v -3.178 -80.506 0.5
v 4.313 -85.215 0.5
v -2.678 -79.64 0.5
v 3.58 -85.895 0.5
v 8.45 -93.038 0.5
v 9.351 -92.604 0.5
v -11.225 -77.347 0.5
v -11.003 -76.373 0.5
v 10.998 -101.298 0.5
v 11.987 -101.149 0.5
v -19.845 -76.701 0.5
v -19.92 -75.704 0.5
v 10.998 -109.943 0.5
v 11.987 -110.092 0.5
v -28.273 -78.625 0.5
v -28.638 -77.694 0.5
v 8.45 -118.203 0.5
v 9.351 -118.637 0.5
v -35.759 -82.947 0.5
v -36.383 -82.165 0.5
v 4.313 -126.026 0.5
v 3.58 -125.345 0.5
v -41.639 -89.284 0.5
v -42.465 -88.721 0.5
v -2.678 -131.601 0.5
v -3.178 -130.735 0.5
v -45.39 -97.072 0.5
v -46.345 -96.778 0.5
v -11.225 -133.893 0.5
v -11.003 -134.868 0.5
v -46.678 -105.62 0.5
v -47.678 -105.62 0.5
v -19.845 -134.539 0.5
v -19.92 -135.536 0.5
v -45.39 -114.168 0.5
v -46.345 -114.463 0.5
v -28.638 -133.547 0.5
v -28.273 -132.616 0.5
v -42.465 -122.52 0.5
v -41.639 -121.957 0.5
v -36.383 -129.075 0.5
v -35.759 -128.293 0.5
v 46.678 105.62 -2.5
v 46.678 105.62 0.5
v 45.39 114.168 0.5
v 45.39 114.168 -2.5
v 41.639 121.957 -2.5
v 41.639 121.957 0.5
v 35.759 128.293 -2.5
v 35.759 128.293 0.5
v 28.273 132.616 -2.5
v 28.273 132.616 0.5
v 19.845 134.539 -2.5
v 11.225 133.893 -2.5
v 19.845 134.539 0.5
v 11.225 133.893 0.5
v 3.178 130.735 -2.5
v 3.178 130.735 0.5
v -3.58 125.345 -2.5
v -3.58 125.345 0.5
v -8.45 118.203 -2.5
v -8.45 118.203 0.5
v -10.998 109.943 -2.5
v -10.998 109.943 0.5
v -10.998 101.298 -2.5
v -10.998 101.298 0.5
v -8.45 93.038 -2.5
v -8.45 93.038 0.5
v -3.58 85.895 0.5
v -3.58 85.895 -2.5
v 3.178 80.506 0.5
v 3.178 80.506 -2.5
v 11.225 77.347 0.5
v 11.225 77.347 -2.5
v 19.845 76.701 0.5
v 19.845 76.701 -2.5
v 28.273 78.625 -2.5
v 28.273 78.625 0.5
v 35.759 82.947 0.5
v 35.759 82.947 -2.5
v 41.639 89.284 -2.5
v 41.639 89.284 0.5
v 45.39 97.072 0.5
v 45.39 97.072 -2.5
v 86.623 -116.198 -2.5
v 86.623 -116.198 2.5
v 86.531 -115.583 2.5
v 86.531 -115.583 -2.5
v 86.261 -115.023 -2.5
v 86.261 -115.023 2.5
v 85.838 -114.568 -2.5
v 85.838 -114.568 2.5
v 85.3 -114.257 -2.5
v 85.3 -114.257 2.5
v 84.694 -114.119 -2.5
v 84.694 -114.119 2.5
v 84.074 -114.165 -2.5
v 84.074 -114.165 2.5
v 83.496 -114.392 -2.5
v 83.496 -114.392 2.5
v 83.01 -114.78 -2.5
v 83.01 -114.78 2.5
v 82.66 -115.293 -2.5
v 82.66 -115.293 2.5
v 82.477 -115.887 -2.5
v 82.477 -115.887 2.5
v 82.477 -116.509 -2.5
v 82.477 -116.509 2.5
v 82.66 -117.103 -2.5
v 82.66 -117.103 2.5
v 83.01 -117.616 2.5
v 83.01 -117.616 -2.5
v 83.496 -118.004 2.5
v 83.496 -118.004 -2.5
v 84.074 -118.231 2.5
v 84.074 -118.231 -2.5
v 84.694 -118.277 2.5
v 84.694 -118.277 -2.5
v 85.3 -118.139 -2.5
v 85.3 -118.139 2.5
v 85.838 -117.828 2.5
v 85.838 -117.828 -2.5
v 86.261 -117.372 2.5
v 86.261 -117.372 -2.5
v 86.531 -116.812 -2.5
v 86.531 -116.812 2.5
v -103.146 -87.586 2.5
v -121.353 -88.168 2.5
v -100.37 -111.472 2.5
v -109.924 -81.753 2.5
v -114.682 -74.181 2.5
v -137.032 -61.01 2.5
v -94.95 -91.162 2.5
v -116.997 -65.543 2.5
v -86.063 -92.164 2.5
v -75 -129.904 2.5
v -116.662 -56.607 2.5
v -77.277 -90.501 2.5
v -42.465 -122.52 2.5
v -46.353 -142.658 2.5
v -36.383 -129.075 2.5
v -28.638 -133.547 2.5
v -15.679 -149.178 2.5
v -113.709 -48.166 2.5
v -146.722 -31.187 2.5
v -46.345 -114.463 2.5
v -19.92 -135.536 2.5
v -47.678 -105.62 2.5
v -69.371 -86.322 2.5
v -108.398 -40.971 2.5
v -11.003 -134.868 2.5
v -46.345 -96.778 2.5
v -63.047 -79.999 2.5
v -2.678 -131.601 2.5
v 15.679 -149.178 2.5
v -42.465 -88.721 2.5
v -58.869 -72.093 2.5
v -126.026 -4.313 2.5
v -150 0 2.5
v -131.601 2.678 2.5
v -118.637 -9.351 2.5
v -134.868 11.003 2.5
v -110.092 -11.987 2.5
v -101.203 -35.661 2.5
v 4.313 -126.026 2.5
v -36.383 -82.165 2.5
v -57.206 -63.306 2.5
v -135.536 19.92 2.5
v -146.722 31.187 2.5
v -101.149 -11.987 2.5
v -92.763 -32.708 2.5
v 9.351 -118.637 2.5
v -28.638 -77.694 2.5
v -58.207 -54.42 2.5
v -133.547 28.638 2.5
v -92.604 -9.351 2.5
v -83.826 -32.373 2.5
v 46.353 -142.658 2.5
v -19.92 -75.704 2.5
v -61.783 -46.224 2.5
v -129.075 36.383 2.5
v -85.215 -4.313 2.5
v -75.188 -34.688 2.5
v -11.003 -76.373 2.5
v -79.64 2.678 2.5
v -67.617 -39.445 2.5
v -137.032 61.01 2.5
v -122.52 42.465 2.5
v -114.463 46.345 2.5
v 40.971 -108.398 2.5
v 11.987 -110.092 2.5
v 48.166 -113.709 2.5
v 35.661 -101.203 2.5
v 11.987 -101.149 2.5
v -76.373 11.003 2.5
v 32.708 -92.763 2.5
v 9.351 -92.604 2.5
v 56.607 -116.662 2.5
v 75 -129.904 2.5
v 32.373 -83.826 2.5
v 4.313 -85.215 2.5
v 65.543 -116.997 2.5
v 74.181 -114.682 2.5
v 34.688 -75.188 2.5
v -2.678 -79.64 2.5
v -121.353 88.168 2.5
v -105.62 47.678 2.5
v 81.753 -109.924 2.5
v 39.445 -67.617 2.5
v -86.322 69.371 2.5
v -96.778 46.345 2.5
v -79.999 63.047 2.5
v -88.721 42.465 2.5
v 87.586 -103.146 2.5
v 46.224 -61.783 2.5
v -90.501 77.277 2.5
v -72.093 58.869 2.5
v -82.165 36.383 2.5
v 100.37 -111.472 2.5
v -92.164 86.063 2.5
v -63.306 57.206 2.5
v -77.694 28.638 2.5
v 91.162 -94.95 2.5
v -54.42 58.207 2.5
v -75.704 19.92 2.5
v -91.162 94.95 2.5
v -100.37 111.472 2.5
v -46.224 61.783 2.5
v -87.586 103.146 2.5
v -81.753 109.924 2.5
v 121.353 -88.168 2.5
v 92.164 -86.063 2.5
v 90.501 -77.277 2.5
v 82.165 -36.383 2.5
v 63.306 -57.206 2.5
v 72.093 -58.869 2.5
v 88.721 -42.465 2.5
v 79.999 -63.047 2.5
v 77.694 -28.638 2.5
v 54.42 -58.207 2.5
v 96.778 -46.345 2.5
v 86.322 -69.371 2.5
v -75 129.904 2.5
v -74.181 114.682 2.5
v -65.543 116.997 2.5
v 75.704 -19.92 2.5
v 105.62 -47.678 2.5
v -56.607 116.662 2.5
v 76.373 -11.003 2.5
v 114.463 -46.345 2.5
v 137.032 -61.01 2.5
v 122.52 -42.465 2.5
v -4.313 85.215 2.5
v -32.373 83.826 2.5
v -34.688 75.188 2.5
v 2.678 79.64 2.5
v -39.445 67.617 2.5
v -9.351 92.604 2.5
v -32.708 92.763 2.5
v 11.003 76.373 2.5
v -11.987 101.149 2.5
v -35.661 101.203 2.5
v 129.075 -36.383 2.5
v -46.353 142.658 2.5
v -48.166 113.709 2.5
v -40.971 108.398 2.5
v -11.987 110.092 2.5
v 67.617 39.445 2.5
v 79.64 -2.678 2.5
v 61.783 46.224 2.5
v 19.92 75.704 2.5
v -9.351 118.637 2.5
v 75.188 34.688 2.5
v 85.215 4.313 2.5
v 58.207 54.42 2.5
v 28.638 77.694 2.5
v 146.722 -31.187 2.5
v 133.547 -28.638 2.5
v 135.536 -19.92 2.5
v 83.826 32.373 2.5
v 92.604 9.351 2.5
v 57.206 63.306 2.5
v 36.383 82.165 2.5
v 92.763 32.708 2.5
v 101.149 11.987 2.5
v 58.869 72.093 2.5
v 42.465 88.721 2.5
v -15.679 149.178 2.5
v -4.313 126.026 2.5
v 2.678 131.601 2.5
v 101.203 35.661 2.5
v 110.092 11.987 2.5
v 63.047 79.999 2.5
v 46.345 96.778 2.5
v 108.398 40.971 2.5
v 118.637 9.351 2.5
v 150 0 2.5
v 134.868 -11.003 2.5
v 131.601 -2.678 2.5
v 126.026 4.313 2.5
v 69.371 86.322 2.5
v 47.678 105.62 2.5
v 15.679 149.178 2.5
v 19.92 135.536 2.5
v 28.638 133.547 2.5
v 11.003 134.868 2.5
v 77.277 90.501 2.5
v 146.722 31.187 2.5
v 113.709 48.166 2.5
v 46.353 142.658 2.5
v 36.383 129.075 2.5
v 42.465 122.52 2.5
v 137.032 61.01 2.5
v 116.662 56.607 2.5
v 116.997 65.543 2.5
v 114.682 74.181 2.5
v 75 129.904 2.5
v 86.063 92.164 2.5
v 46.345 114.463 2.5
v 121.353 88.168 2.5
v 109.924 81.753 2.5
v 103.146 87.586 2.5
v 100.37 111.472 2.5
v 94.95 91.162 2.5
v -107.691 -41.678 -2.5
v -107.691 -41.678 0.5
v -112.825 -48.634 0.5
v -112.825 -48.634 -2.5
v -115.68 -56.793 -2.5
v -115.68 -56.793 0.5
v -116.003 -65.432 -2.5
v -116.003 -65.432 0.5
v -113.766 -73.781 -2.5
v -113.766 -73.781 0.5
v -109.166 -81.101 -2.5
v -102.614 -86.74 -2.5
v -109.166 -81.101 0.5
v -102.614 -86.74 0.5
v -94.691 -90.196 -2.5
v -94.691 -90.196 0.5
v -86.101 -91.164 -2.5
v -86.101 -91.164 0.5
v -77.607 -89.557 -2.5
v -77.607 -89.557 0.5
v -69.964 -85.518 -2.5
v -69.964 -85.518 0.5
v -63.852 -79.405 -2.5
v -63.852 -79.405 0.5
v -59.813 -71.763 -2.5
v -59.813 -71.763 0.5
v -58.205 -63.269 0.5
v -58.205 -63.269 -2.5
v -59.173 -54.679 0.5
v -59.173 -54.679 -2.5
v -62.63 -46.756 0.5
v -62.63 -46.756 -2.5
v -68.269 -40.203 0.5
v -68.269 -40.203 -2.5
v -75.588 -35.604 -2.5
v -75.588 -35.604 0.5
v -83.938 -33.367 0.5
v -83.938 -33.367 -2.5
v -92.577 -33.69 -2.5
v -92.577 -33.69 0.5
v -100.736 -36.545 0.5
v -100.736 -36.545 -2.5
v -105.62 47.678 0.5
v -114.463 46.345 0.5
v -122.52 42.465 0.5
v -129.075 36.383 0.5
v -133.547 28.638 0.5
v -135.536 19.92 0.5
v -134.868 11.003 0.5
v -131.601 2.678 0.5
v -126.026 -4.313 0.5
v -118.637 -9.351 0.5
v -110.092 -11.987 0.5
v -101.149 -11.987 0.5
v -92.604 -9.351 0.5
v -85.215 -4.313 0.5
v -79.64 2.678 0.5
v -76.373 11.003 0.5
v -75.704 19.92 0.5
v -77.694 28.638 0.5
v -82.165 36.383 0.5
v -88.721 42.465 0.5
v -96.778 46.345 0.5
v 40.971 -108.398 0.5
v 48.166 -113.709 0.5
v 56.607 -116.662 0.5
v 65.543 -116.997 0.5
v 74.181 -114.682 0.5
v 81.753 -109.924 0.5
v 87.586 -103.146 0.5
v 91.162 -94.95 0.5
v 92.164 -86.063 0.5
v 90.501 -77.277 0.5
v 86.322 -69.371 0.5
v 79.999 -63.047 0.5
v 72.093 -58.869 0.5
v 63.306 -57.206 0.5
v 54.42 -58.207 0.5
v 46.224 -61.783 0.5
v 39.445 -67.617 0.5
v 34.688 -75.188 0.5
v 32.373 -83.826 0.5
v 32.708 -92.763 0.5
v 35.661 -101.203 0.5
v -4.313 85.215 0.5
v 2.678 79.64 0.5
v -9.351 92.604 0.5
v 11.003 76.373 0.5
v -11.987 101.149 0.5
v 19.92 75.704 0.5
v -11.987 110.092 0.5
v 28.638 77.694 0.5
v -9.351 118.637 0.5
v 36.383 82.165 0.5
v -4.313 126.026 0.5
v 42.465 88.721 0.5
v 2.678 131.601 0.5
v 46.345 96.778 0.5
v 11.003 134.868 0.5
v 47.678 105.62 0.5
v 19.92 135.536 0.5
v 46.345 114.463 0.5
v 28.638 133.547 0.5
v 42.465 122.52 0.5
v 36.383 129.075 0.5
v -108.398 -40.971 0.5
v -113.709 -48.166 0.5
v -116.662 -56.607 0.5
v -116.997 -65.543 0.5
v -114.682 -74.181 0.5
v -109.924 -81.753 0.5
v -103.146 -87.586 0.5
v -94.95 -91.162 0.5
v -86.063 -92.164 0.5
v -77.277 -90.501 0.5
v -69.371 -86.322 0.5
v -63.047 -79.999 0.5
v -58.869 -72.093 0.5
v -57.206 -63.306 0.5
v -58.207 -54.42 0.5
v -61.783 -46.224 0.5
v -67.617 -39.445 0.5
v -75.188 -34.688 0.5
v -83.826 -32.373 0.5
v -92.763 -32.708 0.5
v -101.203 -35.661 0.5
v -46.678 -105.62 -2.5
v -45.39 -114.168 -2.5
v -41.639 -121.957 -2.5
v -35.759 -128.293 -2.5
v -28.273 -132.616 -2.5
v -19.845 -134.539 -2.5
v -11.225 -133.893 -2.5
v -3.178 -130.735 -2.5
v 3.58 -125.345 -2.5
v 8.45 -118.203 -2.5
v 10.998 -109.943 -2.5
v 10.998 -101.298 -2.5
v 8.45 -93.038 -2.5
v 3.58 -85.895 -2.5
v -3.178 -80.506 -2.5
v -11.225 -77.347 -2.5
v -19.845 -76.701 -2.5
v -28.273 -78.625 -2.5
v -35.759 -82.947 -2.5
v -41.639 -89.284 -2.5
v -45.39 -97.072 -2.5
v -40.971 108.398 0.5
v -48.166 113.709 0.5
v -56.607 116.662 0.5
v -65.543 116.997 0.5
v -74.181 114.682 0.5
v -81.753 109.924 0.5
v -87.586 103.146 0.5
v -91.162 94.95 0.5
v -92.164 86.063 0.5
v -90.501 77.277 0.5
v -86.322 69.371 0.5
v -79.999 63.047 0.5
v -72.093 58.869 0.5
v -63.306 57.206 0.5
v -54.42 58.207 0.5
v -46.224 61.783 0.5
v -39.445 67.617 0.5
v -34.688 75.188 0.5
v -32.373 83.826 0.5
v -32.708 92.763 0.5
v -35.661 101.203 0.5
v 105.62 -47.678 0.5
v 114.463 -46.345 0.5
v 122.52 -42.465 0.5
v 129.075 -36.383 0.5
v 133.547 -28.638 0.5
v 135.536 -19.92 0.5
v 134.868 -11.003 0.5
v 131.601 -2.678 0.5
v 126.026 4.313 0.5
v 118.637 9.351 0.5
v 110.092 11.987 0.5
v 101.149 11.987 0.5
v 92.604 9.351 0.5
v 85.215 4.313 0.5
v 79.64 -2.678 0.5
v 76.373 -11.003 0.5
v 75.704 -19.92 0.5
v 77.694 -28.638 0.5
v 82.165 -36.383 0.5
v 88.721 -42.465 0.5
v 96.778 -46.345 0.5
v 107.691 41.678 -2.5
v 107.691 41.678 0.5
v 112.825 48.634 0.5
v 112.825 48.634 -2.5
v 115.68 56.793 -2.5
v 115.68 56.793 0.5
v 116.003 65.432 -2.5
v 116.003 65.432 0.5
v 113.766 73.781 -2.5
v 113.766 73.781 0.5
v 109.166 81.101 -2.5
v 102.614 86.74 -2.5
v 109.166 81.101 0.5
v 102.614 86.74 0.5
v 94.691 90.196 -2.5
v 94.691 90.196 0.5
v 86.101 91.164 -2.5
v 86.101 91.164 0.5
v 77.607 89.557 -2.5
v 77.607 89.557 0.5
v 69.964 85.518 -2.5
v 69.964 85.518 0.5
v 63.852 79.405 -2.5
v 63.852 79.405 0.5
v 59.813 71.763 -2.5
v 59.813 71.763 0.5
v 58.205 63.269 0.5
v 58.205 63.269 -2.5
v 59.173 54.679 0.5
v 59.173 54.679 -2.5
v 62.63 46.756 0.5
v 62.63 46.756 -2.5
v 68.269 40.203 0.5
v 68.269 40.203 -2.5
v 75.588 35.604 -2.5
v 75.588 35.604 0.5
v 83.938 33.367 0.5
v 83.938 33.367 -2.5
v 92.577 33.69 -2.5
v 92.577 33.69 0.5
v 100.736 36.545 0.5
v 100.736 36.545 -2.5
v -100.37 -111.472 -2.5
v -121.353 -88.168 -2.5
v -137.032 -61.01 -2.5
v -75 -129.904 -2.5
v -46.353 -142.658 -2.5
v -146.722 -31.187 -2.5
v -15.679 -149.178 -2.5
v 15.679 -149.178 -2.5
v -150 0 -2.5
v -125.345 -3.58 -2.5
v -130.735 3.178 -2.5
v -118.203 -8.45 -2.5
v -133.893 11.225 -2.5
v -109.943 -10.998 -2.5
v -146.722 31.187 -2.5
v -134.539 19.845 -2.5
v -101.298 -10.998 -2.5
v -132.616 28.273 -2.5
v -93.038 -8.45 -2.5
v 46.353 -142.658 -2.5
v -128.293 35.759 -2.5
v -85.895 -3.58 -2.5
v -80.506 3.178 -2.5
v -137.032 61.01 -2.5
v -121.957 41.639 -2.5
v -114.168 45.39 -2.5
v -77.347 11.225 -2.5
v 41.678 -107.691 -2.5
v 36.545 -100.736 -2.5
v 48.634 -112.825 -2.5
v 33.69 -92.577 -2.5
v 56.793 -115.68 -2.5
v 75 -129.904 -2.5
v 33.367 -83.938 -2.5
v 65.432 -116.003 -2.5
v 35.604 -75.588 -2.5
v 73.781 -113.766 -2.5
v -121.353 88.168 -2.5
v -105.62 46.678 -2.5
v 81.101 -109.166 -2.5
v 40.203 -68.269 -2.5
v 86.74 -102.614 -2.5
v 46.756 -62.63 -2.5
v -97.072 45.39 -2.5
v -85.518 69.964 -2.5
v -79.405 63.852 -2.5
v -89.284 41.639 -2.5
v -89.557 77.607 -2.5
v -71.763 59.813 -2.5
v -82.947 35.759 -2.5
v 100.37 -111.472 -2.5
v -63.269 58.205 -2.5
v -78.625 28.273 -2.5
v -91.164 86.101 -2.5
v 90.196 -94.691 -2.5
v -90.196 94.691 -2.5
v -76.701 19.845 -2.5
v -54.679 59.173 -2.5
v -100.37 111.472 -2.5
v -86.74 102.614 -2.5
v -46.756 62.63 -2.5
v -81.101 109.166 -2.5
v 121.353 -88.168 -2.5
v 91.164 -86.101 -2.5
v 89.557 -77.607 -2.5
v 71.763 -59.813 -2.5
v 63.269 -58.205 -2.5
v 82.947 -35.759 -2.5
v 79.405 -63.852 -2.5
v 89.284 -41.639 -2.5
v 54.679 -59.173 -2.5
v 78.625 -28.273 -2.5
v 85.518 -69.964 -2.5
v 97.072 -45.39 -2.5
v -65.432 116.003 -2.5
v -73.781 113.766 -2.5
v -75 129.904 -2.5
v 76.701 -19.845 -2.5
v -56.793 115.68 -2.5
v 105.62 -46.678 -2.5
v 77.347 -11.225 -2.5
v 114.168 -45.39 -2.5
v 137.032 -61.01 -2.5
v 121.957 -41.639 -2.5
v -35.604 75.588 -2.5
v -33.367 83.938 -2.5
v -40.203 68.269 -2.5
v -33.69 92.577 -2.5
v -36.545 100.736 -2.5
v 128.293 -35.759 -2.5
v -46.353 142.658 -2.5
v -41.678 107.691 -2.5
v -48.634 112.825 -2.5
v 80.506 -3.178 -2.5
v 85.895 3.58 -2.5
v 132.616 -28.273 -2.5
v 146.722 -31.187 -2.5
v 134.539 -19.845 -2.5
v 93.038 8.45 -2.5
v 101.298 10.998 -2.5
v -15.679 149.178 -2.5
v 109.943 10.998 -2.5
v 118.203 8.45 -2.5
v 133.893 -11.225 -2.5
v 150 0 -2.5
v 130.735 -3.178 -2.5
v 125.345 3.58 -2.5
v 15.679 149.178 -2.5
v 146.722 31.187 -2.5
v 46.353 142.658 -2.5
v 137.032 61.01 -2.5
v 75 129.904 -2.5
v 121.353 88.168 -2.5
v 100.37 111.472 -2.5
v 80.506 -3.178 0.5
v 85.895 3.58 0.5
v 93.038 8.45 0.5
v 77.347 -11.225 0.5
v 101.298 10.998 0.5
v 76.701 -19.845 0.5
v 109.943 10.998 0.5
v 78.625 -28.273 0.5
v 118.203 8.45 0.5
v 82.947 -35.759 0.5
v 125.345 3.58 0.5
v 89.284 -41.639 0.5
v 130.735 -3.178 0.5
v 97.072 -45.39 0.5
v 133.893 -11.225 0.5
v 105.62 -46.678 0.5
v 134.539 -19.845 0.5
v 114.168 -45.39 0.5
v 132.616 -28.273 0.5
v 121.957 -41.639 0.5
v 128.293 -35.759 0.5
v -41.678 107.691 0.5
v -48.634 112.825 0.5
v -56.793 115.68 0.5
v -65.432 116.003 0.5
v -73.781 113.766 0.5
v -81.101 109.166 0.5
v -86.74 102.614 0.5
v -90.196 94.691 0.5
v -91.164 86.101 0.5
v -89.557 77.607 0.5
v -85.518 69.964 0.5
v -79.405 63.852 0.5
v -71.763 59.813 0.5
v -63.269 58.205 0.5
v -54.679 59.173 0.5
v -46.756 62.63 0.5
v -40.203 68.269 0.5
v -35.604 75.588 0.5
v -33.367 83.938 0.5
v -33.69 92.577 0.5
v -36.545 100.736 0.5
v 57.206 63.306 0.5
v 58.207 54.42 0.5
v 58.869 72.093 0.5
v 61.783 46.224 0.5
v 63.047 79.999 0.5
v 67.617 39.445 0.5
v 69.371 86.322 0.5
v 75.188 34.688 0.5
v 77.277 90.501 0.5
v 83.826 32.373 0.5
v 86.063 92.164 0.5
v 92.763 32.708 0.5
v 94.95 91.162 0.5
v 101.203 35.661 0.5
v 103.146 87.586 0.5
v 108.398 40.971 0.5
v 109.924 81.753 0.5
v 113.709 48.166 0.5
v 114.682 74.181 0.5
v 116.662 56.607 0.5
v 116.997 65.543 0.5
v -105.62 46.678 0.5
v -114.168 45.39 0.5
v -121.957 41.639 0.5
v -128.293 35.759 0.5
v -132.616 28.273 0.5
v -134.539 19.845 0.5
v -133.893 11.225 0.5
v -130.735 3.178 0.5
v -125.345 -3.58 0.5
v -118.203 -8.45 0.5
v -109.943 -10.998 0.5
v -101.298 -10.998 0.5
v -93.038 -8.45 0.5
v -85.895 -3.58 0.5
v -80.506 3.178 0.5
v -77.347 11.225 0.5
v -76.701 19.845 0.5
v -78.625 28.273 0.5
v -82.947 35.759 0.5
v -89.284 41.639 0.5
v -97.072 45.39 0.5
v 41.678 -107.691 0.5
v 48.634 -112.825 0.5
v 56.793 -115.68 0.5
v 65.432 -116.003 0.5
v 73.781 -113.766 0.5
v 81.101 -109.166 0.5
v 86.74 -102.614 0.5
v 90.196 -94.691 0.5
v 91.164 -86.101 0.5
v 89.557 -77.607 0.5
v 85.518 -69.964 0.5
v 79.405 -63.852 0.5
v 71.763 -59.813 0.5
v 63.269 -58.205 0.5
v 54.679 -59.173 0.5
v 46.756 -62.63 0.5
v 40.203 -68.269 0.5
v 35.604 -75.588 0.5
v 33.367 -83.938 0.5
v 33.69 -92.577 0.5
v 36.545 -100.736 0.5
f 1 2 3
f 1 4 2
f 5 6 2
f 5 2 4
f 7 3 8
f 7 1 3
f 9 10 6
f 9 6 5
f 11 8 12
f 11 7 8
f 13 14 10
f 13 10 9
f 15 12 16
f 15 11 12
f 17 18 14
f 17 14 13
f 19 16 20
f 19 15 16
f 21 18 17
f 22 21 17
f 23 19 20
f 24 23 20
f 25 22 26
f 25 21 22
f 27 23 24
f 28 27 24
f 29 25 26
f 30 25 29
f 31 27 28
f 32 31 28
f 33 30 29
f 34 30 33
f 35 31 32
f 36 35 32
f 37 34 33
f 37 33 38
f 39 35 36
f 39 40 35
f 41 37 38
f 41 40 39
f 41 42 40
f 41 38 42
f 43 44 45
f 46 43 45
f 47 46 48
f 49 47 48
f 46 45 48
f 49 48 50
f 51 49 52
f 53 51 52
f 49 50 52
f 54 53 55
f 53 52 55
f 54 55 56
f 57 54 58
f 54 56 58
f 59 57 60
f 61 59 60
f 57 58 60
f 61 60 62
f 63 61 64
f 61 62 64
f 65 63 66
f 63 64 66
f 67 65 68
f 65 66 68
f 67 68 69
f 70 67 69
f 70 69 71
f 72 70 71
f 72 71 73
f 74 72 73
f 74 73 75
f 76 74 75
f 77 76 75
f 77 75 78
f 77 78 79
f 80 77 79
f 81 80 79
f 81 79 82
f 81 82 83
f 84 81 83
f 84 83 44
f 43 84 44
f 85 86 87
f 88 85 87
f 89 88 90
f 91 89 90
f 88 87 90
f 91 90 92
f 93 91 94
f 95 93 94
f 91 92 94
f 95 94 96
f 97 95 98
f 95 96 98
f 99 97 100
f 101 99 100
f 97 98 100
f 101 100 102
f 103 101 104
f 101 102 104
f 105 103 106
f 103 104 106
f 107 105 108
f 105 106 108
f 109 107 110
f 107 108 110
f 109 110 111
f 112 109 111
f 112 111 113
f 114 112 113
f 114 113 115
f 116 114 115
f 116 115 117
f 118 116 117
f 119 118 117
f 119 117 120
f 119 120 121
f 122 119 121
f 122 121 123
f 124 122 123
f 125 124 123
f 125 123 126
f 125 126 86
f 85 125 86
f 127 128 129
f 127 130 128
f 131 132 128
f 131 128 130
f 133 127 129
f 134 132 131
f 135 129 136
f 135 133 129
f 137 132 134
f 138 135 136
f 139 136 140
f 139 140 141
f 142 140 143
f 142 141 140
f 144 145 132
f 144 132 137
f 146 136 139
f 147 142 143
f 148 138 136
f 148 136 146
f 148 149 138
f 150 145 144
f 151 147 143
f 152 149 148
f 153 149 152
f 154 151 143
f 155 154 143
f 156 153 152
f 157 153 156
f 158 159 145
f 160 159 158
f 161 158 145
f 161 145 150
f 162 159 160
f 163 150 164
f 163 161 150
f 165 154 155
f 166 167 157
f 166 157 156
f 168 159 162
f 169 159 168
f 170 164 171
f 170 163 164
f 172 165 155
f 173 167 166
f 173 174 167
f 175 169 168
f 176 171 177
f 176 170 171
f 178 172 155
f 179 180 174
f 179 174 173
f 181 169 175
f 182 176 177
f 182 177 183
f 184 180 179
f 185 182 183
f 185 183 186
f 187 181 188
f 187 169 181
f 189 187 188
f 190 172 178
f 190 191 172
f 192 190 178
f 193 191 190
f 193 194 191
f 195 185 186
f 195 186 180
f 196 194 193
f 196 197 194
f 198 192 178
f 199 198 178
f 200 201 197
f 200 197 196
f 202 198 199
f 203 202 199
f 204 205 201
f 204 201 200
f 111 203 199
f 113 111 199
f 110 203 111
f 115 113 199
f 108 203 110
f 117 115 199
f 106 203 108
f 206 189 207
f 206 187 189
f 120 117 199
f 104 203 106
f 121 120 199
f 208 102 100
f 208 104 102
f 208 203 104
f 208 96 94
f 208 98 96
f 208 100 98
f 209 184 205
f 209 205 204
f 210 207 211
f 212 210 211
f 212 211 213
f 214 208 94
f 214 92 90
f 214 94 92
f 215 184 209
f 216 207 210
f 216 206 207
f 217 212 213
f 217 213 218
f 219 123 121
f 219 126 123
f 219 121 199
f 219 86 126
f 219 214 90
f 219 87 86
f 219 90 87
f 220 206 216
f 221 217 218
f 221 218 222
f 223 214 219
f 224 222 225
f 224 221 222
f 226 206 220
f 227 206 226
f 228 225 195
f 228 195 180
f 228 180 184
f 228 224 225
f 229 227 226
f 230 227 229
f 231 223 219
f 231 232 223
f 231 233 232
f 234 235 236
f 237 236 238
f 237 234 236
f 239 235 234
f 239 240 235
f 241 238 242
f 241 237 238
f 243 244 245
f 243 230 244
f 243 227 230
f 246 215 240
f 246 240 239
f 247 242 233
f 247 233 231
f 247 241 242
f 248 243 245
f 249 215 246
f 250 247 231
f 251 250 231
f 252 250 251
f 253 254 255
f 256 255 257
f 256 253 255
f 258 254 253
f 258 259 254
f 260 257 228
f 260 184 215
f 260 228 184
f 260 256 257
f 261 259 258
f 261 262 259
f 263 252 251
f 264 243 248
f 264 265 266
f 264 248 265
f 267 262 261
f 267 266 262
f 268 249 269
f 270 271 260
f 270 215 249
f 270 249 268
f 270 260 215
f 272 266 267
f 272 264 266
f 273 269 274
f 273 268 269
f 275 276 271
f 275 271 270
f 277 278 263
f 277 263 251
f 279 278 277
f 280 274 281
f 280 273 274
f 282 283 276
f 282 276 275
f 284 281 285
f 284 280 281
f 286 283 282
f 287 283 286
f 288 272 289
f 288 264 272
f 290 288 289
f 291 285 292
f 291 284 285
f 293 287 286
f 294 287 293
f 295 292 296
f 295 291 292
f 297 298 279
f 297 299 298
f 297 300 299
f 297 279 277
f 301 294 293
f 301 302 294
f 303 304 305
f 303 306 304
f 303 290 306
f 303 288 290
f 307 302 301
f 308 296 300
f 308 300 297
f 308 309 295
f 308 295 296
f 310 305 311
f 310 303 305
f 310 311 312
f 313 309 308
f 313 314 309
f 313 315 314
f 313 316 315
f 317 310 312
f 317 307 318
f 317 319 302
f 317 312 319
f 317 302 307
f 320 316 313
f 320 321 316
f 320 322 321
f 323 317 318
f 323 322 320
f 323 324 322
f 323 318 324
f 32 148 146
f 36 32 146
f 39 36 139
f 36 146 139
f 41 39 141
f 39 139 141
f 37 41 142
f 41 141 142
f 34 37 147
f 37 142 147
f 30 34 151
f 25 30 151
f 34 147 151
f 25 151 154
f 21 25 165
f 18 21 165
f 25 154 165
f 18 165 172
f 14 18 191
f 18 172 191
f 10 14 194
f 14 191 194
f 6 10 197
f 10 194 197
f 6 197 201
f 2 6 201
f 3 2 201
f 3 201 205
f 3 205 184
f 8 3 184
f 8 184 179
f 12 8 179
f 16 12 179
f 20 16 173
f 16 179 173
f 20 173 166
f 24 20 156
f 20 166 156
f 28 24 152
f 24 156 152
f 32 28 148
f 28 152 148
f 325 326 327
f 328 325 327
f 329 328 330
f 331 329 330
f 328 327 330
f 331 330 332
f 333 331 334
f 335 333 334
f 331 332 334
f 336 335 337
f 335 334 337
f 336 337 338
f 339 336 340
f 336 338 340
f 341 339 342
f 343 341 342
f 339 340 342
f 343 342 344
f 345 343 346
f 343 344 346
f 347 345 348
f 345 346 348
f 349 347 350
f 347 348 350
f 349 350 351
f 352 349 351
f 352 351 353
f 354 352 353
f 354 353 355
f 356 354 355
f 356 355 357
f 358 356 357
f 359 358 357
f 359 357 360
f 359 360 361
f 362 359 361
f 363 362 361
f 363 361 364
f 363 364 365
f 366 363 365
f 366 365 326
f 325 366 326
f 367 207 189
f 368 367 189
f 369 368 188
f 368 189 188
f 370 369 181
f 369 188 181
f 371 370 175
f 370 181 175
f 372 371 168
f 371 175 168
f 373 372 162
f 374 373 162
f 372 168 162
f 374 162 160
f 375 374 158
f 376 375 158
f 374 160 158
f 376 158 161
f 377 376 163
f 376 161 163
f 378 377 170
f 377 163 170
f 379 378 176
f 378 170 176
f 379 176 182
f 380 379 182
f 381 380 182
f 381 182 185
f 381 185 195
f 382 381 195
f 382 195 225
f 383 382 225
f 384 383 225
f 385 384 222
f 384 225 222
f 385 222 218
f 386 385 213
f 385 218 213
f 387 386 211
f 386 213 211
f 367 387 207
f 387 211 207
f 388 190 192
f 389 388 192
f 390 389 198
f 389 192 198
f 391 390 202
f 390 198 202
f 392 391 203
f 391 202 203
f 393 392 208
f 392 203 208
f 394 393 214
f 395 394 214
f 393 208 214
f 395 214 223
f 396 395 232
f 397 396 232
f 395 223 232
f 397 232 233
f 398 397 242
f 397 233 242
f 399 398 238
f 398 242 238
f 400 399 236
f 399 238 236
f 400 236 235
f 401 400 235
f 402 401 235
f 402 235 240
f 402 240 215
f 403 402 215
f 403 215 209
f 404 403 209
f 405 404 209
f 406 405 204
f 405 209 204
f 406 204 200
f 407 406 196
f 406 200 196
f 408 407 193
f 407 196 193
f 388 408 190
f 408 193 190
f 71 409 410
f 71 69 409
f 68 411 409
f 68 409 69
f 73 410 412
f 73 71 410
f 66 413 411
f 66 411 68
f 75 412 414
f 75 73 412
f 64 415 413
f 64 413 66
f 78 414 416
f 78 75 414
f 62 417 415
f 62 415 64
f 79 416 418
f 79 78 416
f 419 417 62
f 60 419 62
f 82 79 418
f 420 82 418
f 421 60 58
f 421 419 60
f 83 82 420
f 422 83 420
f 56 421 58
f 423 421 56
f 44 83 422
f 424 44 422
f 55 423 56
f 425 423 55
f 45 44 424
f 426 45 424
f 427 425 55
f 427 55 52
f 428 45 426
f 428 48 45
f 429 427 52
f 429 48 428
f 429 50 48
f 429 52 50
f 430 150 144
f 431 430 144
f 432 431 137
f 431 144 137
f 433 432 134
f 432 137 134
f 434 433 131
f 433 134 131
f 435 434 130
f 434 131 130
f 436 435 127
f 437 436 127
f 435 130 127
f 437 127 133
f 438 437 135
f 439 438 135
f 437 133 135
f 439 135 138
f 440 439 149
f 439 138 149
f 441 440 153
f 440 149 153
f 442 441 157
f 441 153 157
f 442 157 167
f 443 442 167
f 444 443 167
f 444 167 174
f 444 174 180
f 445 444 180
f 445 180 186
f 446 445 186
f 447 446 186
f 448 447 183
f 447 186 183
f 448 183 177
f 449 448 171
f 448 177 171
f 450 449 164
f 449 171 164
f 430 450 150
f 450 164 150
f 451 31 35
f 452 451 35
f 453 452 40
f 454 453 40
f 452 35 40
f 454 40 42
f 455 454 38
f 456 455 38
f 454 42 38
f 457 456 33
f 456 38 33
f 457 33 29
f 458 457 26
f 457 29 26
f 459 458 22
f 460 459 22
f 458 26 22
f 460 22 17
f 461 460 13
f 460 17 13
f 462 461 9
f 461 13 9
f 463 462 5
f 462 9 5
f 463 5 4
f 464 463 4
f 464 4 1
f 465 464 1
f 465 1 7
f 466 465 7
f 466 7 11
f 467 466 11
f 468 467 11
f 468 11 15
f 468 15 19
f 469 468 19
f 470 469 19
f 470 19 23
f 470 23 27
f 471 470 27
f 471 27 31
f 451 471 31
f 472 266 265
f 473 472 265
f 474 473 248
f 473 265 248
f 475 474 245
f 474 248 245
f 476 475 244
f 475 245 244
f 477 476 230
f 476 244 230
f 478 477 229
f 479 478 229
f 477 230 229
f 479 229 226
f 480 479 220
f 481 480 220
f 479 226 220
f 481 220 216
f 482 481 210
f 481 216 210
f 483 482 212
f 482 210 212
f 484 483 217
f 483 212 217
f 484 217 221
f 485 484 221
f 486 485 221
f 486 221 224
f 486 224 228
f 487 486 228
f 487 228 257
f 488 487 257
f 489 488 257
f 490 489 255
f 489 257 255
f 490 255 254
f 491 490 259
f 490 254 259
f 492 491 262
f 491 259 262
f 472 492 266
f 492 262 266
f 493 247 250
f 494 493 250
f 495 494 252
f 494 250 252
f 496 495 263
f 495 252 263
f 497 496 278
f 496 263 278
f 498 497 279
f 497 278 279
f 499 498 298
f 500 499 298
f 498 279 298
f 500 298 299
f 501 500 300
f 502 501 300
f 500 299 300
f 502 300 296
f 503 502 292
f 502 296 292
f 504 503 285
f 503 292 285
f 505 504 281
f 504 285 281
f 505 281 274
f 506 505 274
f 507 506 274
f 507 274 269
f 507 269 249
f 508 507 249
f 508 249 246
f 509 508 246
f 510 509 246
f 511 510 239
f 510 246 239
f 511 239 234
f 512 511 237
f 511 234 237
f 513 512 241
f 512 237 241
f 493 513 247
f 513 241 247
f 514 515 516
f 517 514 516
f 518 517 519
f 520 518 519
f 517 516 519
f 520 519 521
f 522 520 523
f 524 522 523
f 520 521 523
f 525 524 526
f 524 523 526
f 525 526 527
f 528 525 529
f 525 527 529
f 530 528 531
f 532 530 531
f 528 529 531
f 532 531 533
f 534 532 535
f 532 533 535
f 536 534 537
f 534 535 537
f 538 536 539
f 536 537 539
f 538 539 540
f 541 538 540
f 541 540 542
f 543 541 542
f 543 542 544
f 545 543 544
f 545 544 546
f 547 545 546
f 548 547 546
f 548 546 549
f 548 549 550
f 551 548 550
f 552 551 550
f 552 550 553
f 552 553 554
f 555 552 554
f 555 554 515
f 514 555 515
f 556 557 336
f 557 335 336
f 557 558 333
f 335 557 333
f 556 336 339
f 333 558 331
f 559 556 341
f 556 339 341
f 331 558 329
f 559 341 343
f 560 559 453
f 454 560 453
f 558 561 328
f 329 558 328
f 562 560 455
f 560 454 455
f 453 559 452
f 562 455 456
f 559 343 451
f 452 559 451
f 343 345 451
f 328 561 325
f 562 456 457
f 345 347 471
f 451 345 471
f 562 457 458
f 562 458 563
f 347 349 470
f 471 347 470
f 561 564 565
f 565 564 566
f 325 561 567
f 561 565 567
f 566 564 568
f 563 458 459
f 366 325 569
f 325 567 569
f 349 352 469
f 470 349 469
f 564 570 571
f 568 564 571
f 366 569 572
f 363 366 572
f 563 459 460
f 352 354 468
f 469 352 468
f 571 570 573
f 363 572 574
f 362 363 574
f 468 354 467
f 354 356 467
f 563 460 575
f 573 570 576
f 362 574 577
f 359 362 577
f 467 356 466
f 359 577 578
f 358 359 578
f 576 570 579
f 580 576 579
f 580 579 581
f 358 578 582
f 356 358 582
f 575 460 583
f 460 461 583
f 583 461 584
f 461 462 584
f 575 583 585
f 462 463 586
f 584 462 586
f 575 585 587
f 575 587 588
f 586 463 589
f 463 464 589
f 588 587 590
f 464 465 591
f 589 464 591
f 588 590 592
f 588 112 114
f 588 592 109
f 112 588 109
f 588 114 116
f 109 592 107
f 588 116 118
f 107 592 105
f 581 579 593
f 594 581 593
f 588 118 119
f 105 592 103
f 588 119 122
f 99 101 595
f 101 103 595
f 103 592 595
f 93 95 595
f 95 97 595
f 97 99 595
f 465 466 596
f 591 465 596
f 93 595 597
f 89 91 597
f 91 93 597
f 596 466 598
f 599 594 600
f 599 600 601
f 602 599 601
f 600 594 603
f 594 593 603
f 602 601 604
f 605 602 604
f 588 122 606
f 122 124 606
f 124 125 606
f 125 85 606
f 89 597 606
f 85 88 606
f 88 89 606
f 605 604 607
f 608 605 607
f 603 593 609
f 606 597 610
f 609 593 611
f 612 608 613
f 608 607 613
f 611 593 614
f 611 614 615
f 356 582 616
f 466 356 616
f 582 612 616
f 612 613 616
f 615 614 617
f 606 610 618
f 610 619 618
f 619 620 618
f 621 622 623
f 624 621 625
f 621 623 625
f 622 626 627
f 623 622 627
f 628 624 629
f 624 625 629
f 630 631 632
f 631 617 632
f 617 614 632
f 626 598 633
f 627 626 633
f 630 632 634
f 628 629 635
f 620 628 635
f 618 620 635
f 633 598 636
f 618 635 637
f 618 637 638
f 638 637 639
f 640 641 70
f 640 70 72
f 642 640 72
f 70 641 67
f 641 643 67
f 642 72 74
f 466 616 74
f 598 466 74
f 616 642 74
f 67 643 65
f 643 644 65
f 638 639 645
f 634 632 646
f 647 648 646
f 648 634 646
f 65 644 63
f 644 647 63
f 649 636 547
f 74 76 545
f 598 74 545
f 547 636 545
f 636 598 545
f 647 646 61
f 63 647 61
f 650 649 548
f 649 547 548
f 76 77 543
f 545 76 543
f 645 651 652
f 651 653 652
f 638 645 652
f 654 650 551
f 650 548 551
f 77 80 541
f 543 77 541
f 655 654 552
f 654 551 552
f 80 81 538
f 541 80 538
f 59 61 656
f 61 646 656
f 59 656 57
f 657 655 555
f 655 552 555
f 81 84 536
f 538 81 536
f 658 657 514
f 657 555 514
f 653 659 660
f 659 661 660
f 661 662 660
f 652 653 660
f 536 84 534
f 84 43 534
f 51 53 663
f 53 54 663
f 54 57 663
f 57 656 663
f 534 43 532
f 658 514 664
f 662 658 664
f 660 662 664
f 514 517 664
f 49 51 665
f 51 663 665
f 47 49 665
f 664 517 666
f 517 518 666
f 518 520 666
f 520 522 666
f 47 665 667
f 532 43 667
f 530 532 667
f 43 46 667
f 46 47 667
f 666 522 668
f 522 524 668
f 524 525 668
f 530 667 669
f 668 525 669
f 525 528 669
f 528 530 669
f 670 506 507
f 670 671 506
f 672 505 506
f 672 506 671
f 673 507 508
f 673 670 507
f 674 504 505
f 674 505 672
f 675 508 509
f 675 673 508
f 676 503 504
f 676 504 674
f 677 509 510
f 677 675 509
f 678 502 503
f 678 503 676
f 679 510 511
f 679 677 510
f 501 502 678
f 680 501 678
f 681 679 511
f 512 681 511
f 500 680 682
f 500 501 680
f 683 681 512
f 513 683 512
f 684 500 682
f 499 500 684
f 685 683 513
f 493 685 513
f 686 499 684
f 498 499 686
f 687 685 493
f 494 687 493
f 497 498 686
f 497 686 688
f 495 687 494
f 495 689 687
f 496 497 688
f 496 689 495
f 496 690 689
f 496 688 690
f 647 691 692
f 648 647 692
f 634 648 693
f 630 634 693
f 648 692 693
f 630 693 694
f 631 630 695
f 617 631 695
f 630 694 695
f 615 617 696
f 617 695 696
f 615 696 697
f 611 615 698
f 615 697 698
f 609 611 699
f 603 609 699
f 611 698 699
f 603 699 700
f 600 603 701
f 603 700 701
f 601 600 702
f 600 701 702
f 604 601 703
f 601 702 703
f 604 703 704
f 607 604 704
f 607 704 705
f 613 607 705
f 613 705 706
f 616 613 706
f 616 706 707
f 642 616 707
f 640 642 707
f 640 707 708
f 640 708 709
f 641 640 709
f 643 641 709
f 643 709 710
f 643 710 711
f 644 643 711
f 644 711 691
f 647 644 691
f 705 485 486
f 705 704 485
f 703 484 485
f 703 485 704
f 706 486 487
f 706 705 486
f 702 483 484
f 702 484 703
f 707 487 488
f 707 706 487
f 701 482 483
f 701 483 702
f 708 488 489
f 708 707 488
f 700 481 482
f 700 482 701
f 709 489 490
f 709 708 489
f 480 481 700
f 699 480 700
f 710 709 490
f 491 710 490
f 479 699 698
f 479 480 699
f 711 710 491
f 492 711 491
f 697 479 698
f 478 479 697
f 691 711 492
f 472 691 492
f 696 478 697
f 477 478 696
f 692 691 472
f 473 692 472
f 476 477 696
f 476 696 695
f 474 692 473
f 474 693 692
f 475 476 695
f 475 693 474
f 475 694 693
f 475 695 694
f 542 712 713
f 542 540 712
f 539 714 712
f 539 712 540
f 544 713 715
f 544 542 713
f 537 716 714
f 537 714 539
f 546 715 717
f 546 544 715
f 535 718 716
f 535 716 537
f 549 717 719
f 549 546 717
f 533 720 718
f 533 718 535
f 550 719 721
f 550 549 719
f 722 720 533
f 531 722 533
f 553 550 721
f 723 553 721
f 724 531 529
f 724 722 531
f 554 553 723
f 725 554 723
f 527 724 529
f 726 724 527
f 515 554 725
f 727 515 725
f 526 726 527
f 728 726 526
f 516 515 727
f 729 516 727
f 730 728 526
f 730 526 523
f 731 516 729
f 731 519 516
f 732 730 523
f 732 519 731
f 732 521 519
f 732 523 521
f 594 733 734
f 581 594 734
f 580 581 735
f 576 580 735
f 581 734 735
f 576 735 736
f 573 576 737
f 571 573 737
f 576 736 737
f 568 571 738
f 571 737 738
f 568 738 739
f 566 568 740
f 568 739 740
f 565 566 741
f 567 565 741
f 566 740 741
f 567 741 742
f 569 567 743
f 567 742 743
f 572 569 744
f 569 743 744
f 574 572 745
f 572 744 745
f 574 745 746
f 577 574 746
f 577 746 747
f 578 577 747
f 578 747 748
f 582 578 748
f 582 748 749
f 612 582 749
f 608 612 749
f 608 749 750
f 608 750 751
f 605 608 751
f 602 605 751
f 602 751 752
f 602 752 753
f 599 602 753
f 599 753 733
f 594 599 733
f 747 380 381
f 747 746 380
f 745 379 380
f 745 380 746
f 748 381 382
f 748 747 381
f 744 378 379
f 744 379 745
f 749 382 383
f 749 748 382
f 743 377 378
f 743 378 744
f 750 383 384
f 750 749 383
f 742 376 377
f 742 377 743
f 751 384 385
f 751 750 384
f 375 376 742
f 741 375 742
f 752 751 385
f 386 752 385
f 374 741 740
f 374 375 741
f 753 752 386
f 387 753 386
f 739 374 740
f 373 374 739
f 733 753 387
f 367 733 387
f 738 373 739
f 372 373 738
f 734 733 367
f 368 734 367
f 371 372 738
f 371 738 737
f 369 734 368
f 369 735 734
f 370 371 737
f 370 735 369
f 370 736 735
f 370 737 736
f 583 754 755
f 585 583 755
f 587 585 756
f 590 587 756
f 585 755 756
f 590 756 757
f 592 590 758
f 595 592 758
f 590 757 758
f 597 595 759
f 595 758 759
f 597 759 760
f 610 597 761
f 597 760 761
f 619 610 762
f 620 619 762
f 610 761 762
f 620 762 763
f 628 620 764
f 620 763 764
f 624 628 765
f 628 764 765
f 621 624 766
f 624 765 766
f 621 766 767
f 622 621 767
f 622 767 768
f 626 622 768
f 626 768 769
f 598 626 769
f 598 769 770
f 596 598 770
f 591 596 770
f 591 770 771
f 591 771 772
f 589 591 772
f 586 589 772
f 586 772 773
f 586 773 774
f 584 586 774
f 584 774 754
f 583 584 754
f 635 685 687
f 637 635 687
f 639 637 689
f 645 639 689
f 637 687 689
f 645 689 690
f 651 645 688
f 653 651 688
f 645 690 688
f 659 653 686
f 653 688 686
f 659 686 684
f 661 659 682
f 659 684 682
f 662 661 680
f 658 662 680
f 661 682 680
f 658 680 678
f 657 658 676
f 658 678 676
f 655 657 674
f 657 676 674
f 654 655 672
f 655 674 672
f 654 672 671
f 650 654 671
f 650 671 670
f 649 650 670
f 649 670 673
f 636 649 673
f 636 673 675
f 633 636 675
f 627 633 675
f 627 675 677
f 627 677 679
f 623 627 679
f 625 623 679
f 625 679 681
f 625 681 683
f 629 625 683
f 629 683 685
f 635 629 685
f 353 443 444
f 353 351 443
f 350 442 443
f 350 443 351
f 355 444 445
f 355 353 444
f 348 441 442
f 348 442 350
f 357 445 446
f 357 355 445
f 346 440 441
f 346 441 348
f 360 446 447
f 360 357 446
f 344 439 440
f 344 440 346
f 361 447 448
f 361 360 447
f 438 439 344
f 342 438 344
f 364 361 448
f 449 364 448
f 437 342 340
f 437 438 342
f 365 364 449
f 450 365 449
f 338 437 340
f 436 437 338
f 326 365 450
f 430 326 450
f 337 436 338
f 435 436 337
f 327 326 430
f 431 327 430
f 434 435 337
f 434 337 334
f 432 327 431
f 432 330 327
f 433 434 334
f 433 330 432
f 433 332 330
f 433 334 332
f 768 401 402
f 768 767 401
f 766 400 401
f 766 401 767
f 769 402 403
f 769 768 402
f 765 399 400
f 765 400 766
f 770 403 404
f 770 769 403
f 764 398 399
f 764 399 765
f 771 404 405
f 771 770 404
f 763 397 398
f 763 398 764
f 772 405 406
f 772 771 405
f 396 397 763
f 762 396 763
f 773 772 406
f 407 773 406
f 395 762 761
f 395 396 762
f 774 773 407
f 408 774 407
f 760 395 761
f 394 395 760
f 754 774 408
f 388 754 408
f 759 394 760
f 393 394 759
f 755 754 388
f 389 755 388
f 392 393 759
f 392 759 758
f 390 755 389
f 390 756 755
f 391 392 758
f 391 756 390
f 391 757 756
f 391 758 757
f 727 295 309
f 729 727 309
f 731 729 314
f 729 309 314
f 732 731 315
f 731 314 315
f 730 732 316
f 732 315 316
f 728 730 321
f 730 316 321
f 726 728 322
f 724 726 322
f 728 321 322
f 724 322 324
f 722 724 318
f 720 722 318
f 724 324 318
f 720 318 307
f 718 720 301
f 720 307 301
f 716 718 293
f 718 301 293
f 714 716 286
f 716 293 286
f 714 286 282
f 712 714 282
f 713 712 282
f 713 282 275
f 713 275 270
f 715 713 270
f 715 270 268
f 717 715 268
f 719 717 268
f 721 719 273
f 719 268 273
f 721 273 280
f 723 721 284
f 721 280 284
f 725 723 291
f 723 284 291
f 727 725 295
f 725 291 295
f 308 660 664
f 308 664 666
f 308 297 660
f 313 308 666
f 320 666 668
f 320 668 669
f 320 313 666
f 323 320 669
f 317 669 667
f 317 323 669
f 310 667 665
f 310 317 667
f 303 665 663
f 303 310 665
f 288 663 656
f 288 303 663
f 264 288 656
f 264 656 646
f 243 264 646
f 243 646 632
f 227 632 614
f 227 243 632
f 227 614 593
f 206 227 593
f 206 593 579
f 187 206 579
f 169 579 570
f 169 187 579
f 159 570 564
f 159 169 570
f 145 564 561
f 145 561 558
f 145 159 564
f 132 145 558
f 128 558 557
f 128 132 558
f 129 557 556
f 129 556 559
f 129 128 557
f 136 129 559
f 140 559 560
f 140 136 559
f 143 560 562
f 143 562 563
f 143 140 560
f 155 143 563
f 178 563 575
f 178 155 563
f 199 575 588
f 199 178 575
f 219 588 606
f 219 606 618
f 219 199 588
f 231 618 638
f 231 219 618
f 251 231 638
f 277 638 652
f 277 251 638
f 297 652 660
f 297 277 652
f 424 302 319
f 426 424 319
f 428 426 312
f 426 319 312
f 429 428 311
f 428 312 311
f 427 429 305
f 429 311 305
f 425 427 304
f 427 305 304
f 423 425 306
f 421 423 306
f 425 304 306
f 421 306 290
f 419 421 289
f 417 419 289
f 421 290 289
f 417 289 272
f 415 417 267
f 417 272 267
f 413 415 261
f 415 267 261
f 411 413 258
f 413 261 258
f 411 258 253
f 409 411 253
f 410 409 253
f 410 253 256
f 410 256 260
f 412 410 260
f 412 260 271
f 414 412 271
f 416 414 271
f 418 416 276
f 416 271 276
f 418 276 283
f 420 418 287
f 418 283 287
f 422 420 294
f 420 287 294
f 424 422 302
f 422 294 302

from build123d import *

# Parameters (mm, degrees)
F0_R            = 150
F1_DEPTH        = 2.5
F2_R            = 29
F3_DEPTH        = 5.001
F3_COPIES_COUNT = 8
F2_R_2          = 30
F4_DEPTH        = 2
F4_COPIES_COUNT = 8
F5_R            = 2.0850492766
F6_DEPTH        = 5.001


# Not quite as in the source:
# - a pattern or mirror of a feature is missing from the dataset's text; its kind, count and spacing are read off the source's solid


with BuildPart() as f1:
    # F0 (on Top) → F1 (new body, symmetric)
    with BuildSketch(Plane.XY):
        Circle(F0_R)
    extrude(amount=F1_DEPTH, both=True)

    # F2 (on face) → F3 (cut, through all)
    with BuildSketch(Plane.XY.offset(2.5)):
        with Locations((17.6781384332, 105.6203827018)):
            Circle(F2_R)
    f3 = extrude(amount=-F3_DEPTH, mode=Mode.SUBTRACT)

    # F3_copies: F3 ×8 about axis
    f3_copies_axis = Axis((0, 0, 0), (0, 0, 1))
    for i in range(1, F3_COPIES_COUNT):
        add(f3.rotate(f3_copies_axis, i * 360 / F3_COPIES_COUNT), mode=Mode.SUBTRACT)

    # F2 (on face) → F4 (cut)
    with BuildSketch(Plane.XY.offset(2.5)):
        with Locations((17.6781384332, 105.6203827018)):
            Circle(F2_R_2)
        with Locations((17.6781384332, 105.6203827018)):
            Circle(F2_R, mode=Mode.SUBTRACT)
    f4 = extrude(amount=-F4_DEPTH, mode=Mode.SUBTRACT)

    # F4_copies: F4 ×8 about axis
    f4_copies_axis = Axis((0, 0, 0), (0, 0, 1))
    for i in range(1, F4_COPIES_COUNT):
        add(f4.rotate(f4_copies_axis, i * 360 / F4_COPIES_COUNT), mode=Mode.SUBTRACT)

    # F5 (on face) → F6 (cut, through all)
    with BuildSketch(Plane.XY.offset(2.5)):
        with Locations((84.5384001732, -116.1978319287)):
            Circle(F5_R)
    extrude(amount=-F6_DEPTH, mode=Mode.SUBTRACT)


solid = f1.part
